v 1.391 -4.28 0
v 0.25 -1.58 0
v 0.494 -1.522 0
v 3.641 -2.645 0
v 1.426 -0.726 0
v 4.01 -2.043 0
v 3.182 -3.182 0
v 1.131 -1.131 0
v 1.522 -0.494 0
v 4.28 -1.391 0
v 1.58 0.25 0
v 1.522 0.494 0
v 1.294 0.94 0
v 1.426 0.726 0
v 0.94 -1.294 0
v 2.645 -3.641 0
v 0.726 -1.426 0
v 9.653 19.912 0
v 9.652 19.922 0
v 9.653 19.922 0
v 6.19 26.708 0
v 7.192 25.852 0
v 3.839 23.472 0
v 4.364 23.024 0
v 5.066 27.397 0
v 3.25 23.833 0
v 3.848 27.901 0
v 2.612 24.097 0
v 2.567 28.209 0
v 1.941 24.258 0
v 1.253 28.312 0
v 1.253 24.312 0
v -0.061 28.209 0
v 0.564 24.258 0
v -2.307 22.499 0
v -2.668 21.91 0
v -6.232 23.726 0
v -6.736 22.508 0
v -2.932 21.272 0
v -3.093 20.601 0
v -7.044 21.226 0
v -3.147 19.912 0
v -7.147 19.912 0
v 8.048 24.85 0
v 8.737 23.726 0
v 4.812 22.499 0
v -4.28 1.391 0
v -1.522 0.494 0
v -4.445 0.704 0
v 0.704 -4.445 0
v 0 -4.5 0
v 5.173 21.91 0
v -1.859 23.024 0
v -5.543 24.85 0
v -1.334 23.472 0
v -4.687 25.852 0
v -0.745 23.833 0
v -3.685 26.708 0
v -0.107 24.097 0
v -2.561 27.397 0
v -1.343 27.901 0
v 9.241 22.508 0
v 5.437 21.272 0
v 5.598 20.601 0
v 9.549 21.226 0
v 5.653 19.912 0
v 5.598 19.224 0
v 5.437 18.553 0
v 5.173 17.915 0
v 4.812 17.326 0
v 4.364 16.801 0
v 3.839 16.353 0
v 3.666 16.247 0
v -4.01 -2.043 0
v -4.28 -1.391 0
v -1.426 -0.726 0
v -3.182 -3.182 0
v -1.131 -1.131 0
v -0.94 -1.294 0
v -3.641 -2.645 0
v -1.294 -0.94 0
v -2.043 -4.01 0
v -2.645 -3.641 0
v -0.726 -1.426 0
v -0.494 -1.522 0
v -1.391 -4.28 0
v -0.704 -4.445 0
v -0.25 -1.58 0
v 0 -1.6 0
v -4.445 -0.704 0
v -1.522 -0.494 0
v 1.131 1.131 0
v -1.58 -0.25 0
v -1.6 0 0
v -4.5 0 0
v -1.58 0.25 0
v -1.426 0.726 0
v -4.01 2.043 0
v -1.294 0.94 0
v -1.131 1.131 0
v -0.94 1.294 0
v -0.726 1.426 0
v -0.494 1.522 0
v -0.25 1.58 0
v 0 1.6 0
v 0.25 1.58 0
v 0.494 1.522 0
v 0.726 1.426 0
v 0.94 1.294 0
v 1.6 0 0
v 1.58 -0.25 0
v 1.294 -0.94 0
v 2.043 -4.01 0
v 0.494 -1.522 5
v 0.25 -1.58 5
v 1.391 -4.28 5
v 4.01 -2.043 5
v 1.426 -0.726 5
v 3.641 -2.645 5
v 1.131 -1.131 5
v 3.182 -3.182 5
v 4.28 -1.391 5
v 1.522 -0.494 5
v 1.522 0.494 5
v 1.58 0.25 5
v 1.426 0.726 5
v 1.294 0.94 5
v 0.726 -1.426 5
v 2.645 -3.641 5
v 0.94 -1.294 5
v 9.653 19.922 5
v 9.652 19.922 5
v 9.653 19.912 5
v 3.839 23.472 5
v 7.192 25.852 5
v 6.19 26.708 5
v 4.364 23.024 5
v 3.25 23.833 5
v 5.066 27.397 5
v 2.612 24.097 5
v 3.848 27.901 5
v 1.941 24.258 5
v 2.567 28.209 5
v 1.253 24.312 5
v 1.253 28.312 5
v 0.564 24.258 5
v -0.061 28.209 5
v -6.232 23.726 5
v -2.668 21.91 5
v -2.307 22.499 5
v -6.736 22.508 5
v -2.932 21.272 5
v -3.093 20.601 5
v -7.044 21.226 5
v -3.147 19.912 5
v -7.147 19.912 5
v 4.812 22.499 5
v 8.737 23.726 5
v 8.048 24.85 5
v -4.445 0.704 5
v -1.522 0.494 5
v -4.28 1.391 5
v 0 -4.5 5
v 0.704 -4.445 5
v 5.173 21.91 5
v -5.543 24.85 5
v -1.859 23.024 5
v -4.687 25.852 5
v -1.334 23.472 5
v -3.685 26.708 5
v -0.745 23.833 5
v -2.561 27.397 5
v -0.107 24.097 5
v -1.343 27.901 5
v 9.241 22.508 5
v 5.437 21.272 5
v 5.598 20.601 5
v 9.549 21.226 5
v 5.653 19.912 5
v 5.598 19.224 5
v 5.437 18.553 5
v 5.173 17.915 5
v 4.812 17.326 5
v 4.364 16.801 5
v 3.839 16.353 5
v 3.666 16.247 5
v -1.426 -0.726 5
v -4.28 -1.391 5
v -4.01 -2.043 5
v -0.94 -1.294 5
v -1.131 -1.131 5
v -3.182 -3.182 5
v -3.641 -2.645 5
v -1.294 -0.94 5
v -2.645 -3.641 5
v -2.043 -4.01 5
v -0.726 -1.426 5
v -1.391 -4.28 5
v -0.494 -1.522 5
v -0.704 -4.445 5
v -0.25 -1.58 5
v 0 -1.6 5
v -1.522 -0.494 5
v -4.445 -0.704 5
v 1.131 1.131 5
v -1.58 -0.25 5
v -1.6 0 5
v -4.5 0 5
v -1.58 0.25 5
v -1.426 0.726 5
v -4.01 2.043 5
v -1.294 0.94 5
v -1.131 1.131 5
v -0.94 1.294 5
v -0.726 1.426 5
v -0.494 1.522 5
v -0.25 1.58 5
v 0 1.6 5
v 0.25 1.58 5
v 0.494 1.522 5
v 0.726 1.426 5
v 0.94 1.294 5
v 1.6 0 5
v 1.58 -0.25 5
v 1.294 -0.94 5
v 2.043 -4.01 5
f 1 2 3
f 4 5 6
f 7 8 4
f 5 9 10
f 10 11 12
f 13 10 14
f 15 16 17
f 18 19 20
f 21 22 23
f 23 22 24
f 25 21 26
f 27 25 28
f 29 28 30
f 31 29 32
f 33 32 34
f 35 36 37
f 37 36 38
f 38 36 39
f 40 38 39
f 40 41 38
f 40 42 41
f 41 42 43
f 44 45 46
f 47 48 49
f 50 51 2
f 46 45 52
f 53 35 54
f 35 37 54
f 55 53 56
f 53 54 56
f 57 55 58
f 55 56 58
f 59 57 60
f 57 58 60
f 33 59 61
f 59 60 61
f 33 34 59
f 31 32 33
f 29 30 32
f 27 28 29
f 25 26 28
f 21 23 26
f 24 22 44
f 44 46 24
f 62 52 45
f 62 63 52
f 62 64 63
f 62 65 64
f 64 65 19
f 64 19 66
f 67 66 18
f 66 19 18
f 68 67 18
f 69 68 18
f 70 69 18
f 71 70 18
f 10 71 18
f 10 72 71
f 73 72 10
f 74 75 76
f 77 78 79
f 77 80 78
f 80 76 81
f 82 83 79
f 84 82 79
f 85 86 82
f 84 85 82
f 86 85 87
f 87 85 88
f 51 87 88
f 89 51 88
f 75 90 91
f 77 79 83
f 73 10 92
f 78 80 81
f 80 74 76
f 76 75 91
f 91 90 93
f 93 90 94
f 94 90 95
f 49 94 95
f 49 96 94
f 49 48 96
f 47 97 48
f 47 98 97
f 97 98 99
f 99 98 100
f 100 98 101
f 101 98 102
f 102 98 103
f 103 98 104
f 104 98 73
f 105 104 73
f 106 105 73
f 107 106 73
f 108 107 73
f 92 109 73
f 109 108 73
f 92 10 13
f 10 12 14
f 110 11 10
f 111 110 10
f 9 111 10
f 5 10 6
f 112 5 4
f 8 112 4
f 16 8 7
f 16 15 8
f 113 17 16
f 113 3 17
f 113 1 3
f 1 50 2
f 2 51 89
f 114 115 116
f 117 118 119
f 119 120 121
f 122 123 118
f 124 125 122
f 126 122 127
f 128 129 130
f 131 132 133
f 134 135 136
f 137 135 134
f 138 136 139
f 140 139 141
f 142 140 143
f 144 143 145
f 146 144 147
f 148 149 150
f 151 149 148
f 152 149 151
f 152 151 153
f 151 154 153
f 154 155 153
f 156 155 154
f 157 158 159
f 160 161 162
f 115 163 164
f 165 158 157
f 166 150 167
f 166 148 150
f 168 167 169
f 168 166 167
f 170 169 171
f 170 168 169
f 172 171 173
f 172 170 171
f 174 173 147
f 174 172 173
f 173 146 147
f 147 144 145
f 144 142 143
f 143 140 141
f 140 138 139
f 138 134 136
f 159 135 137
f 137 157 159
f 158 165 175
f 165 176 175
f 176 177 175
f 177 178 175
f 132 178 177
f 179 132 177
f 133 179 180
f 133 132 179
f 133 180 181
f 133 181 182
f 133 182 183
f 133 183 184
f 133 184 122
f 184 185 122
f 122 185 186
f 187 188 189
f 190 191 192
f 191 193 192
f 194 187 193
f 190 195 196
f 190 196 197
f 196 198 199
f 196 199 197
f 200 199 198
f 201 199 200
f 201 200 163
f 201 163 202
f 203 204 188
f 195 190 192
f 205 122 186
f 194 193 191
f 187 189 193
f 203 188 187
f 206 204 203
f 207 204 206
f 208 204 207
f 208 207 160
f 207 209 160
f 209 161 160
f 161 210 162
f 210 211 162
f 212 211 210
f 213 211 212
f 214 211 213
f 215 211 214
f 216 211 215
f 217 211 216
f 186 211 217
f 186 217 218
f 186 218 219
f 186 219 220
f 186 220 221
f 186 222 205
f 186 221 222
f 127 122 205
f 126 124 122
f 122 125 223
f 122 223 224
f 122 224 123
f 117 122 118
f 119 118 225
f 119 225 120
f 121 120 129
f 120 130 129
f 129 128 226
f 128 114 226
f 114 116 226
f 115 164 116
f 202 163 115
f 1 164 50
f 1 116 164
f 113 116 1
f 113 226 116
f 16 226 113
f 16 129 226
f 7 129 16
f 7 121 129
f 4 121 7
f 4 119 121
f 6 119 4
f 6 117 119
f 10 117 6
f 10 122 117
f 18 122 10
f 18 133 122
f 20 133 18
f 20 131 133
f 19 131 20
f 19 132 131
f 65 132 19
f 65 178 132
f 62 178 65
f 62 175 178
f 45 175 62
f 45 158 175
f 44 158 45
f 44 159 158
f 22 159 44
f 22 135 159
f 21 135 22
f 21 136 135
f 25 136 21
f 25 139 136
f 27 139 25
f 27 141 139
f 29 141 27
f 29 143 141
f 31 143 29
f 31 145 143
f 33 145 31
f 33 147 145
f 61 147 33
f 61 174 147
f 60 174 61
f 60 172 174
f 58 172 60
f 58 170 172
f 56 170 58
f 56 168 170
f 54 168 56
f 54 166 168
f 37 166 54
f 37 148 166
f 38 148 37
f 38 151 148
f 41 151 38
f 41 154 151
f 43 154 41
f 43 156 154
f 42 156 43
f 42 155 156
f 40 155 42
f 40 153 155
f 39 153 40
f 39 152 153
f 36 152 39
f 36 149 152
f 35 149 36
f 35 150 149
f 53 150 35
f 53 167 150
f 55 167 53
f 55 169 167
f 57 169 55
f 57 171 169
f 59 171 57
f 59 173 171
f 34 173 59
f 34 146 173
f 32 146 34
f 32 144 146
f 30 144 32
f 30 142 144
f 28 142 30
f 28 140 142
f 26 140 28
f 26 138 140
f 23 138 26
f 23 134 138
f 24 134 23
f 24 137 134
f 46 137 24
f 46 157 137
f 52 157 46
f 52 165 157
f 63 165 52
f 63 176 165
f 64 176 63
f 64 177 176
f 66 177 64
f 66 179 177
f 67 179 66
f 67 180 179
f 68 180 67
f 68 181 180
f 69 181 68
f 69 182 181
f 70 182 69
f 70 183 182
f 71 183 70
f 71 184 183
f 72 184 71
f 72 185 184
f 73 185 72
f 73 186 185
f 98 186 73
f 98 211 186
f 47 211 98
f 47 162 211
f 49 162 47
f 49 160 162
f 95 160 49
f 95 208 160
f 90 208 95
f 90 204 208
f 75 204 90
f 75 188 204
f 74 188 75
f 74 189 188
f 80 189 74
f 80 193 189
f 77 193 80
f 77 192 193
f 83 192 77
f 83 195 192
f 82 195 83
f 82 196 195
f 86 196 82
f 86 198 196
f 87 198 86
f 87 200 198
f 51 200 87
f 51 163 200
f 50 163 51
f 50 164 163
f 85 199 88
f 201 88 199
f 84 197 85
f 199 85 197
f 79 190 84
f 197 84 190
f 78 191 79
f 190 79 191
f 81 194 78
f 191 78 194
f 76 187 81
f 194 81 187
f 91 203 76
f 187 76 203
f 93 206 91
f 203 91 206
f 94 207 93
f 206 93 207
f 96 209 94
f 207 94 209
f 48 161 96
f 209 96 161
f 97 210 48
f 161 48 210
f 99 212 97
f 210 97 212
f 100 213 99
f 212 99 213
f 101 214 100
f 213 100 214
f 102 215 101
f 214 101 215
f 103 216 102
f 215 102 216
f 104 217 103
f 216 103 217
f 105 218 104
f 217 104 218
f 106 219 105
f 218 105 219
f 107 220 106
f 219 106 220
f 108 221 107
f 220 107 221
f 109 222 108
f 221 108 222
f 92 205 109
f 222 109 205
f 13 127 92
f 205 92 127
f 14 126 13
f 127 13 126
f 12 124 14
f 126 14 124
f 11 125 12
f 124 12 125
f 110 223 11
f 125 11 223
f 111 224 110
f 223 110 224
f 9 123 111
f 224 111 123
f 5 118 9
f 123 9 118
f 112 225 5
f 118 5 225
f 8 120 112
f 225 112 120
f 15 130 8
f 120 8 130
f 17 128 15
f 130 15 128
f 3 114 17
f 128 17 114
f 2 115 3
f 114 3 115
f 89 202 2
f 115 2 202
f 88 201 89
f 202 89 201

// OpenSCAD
include <../lib/spool-drybox-lib.scad>;
$fn = 40;
latch_link();
